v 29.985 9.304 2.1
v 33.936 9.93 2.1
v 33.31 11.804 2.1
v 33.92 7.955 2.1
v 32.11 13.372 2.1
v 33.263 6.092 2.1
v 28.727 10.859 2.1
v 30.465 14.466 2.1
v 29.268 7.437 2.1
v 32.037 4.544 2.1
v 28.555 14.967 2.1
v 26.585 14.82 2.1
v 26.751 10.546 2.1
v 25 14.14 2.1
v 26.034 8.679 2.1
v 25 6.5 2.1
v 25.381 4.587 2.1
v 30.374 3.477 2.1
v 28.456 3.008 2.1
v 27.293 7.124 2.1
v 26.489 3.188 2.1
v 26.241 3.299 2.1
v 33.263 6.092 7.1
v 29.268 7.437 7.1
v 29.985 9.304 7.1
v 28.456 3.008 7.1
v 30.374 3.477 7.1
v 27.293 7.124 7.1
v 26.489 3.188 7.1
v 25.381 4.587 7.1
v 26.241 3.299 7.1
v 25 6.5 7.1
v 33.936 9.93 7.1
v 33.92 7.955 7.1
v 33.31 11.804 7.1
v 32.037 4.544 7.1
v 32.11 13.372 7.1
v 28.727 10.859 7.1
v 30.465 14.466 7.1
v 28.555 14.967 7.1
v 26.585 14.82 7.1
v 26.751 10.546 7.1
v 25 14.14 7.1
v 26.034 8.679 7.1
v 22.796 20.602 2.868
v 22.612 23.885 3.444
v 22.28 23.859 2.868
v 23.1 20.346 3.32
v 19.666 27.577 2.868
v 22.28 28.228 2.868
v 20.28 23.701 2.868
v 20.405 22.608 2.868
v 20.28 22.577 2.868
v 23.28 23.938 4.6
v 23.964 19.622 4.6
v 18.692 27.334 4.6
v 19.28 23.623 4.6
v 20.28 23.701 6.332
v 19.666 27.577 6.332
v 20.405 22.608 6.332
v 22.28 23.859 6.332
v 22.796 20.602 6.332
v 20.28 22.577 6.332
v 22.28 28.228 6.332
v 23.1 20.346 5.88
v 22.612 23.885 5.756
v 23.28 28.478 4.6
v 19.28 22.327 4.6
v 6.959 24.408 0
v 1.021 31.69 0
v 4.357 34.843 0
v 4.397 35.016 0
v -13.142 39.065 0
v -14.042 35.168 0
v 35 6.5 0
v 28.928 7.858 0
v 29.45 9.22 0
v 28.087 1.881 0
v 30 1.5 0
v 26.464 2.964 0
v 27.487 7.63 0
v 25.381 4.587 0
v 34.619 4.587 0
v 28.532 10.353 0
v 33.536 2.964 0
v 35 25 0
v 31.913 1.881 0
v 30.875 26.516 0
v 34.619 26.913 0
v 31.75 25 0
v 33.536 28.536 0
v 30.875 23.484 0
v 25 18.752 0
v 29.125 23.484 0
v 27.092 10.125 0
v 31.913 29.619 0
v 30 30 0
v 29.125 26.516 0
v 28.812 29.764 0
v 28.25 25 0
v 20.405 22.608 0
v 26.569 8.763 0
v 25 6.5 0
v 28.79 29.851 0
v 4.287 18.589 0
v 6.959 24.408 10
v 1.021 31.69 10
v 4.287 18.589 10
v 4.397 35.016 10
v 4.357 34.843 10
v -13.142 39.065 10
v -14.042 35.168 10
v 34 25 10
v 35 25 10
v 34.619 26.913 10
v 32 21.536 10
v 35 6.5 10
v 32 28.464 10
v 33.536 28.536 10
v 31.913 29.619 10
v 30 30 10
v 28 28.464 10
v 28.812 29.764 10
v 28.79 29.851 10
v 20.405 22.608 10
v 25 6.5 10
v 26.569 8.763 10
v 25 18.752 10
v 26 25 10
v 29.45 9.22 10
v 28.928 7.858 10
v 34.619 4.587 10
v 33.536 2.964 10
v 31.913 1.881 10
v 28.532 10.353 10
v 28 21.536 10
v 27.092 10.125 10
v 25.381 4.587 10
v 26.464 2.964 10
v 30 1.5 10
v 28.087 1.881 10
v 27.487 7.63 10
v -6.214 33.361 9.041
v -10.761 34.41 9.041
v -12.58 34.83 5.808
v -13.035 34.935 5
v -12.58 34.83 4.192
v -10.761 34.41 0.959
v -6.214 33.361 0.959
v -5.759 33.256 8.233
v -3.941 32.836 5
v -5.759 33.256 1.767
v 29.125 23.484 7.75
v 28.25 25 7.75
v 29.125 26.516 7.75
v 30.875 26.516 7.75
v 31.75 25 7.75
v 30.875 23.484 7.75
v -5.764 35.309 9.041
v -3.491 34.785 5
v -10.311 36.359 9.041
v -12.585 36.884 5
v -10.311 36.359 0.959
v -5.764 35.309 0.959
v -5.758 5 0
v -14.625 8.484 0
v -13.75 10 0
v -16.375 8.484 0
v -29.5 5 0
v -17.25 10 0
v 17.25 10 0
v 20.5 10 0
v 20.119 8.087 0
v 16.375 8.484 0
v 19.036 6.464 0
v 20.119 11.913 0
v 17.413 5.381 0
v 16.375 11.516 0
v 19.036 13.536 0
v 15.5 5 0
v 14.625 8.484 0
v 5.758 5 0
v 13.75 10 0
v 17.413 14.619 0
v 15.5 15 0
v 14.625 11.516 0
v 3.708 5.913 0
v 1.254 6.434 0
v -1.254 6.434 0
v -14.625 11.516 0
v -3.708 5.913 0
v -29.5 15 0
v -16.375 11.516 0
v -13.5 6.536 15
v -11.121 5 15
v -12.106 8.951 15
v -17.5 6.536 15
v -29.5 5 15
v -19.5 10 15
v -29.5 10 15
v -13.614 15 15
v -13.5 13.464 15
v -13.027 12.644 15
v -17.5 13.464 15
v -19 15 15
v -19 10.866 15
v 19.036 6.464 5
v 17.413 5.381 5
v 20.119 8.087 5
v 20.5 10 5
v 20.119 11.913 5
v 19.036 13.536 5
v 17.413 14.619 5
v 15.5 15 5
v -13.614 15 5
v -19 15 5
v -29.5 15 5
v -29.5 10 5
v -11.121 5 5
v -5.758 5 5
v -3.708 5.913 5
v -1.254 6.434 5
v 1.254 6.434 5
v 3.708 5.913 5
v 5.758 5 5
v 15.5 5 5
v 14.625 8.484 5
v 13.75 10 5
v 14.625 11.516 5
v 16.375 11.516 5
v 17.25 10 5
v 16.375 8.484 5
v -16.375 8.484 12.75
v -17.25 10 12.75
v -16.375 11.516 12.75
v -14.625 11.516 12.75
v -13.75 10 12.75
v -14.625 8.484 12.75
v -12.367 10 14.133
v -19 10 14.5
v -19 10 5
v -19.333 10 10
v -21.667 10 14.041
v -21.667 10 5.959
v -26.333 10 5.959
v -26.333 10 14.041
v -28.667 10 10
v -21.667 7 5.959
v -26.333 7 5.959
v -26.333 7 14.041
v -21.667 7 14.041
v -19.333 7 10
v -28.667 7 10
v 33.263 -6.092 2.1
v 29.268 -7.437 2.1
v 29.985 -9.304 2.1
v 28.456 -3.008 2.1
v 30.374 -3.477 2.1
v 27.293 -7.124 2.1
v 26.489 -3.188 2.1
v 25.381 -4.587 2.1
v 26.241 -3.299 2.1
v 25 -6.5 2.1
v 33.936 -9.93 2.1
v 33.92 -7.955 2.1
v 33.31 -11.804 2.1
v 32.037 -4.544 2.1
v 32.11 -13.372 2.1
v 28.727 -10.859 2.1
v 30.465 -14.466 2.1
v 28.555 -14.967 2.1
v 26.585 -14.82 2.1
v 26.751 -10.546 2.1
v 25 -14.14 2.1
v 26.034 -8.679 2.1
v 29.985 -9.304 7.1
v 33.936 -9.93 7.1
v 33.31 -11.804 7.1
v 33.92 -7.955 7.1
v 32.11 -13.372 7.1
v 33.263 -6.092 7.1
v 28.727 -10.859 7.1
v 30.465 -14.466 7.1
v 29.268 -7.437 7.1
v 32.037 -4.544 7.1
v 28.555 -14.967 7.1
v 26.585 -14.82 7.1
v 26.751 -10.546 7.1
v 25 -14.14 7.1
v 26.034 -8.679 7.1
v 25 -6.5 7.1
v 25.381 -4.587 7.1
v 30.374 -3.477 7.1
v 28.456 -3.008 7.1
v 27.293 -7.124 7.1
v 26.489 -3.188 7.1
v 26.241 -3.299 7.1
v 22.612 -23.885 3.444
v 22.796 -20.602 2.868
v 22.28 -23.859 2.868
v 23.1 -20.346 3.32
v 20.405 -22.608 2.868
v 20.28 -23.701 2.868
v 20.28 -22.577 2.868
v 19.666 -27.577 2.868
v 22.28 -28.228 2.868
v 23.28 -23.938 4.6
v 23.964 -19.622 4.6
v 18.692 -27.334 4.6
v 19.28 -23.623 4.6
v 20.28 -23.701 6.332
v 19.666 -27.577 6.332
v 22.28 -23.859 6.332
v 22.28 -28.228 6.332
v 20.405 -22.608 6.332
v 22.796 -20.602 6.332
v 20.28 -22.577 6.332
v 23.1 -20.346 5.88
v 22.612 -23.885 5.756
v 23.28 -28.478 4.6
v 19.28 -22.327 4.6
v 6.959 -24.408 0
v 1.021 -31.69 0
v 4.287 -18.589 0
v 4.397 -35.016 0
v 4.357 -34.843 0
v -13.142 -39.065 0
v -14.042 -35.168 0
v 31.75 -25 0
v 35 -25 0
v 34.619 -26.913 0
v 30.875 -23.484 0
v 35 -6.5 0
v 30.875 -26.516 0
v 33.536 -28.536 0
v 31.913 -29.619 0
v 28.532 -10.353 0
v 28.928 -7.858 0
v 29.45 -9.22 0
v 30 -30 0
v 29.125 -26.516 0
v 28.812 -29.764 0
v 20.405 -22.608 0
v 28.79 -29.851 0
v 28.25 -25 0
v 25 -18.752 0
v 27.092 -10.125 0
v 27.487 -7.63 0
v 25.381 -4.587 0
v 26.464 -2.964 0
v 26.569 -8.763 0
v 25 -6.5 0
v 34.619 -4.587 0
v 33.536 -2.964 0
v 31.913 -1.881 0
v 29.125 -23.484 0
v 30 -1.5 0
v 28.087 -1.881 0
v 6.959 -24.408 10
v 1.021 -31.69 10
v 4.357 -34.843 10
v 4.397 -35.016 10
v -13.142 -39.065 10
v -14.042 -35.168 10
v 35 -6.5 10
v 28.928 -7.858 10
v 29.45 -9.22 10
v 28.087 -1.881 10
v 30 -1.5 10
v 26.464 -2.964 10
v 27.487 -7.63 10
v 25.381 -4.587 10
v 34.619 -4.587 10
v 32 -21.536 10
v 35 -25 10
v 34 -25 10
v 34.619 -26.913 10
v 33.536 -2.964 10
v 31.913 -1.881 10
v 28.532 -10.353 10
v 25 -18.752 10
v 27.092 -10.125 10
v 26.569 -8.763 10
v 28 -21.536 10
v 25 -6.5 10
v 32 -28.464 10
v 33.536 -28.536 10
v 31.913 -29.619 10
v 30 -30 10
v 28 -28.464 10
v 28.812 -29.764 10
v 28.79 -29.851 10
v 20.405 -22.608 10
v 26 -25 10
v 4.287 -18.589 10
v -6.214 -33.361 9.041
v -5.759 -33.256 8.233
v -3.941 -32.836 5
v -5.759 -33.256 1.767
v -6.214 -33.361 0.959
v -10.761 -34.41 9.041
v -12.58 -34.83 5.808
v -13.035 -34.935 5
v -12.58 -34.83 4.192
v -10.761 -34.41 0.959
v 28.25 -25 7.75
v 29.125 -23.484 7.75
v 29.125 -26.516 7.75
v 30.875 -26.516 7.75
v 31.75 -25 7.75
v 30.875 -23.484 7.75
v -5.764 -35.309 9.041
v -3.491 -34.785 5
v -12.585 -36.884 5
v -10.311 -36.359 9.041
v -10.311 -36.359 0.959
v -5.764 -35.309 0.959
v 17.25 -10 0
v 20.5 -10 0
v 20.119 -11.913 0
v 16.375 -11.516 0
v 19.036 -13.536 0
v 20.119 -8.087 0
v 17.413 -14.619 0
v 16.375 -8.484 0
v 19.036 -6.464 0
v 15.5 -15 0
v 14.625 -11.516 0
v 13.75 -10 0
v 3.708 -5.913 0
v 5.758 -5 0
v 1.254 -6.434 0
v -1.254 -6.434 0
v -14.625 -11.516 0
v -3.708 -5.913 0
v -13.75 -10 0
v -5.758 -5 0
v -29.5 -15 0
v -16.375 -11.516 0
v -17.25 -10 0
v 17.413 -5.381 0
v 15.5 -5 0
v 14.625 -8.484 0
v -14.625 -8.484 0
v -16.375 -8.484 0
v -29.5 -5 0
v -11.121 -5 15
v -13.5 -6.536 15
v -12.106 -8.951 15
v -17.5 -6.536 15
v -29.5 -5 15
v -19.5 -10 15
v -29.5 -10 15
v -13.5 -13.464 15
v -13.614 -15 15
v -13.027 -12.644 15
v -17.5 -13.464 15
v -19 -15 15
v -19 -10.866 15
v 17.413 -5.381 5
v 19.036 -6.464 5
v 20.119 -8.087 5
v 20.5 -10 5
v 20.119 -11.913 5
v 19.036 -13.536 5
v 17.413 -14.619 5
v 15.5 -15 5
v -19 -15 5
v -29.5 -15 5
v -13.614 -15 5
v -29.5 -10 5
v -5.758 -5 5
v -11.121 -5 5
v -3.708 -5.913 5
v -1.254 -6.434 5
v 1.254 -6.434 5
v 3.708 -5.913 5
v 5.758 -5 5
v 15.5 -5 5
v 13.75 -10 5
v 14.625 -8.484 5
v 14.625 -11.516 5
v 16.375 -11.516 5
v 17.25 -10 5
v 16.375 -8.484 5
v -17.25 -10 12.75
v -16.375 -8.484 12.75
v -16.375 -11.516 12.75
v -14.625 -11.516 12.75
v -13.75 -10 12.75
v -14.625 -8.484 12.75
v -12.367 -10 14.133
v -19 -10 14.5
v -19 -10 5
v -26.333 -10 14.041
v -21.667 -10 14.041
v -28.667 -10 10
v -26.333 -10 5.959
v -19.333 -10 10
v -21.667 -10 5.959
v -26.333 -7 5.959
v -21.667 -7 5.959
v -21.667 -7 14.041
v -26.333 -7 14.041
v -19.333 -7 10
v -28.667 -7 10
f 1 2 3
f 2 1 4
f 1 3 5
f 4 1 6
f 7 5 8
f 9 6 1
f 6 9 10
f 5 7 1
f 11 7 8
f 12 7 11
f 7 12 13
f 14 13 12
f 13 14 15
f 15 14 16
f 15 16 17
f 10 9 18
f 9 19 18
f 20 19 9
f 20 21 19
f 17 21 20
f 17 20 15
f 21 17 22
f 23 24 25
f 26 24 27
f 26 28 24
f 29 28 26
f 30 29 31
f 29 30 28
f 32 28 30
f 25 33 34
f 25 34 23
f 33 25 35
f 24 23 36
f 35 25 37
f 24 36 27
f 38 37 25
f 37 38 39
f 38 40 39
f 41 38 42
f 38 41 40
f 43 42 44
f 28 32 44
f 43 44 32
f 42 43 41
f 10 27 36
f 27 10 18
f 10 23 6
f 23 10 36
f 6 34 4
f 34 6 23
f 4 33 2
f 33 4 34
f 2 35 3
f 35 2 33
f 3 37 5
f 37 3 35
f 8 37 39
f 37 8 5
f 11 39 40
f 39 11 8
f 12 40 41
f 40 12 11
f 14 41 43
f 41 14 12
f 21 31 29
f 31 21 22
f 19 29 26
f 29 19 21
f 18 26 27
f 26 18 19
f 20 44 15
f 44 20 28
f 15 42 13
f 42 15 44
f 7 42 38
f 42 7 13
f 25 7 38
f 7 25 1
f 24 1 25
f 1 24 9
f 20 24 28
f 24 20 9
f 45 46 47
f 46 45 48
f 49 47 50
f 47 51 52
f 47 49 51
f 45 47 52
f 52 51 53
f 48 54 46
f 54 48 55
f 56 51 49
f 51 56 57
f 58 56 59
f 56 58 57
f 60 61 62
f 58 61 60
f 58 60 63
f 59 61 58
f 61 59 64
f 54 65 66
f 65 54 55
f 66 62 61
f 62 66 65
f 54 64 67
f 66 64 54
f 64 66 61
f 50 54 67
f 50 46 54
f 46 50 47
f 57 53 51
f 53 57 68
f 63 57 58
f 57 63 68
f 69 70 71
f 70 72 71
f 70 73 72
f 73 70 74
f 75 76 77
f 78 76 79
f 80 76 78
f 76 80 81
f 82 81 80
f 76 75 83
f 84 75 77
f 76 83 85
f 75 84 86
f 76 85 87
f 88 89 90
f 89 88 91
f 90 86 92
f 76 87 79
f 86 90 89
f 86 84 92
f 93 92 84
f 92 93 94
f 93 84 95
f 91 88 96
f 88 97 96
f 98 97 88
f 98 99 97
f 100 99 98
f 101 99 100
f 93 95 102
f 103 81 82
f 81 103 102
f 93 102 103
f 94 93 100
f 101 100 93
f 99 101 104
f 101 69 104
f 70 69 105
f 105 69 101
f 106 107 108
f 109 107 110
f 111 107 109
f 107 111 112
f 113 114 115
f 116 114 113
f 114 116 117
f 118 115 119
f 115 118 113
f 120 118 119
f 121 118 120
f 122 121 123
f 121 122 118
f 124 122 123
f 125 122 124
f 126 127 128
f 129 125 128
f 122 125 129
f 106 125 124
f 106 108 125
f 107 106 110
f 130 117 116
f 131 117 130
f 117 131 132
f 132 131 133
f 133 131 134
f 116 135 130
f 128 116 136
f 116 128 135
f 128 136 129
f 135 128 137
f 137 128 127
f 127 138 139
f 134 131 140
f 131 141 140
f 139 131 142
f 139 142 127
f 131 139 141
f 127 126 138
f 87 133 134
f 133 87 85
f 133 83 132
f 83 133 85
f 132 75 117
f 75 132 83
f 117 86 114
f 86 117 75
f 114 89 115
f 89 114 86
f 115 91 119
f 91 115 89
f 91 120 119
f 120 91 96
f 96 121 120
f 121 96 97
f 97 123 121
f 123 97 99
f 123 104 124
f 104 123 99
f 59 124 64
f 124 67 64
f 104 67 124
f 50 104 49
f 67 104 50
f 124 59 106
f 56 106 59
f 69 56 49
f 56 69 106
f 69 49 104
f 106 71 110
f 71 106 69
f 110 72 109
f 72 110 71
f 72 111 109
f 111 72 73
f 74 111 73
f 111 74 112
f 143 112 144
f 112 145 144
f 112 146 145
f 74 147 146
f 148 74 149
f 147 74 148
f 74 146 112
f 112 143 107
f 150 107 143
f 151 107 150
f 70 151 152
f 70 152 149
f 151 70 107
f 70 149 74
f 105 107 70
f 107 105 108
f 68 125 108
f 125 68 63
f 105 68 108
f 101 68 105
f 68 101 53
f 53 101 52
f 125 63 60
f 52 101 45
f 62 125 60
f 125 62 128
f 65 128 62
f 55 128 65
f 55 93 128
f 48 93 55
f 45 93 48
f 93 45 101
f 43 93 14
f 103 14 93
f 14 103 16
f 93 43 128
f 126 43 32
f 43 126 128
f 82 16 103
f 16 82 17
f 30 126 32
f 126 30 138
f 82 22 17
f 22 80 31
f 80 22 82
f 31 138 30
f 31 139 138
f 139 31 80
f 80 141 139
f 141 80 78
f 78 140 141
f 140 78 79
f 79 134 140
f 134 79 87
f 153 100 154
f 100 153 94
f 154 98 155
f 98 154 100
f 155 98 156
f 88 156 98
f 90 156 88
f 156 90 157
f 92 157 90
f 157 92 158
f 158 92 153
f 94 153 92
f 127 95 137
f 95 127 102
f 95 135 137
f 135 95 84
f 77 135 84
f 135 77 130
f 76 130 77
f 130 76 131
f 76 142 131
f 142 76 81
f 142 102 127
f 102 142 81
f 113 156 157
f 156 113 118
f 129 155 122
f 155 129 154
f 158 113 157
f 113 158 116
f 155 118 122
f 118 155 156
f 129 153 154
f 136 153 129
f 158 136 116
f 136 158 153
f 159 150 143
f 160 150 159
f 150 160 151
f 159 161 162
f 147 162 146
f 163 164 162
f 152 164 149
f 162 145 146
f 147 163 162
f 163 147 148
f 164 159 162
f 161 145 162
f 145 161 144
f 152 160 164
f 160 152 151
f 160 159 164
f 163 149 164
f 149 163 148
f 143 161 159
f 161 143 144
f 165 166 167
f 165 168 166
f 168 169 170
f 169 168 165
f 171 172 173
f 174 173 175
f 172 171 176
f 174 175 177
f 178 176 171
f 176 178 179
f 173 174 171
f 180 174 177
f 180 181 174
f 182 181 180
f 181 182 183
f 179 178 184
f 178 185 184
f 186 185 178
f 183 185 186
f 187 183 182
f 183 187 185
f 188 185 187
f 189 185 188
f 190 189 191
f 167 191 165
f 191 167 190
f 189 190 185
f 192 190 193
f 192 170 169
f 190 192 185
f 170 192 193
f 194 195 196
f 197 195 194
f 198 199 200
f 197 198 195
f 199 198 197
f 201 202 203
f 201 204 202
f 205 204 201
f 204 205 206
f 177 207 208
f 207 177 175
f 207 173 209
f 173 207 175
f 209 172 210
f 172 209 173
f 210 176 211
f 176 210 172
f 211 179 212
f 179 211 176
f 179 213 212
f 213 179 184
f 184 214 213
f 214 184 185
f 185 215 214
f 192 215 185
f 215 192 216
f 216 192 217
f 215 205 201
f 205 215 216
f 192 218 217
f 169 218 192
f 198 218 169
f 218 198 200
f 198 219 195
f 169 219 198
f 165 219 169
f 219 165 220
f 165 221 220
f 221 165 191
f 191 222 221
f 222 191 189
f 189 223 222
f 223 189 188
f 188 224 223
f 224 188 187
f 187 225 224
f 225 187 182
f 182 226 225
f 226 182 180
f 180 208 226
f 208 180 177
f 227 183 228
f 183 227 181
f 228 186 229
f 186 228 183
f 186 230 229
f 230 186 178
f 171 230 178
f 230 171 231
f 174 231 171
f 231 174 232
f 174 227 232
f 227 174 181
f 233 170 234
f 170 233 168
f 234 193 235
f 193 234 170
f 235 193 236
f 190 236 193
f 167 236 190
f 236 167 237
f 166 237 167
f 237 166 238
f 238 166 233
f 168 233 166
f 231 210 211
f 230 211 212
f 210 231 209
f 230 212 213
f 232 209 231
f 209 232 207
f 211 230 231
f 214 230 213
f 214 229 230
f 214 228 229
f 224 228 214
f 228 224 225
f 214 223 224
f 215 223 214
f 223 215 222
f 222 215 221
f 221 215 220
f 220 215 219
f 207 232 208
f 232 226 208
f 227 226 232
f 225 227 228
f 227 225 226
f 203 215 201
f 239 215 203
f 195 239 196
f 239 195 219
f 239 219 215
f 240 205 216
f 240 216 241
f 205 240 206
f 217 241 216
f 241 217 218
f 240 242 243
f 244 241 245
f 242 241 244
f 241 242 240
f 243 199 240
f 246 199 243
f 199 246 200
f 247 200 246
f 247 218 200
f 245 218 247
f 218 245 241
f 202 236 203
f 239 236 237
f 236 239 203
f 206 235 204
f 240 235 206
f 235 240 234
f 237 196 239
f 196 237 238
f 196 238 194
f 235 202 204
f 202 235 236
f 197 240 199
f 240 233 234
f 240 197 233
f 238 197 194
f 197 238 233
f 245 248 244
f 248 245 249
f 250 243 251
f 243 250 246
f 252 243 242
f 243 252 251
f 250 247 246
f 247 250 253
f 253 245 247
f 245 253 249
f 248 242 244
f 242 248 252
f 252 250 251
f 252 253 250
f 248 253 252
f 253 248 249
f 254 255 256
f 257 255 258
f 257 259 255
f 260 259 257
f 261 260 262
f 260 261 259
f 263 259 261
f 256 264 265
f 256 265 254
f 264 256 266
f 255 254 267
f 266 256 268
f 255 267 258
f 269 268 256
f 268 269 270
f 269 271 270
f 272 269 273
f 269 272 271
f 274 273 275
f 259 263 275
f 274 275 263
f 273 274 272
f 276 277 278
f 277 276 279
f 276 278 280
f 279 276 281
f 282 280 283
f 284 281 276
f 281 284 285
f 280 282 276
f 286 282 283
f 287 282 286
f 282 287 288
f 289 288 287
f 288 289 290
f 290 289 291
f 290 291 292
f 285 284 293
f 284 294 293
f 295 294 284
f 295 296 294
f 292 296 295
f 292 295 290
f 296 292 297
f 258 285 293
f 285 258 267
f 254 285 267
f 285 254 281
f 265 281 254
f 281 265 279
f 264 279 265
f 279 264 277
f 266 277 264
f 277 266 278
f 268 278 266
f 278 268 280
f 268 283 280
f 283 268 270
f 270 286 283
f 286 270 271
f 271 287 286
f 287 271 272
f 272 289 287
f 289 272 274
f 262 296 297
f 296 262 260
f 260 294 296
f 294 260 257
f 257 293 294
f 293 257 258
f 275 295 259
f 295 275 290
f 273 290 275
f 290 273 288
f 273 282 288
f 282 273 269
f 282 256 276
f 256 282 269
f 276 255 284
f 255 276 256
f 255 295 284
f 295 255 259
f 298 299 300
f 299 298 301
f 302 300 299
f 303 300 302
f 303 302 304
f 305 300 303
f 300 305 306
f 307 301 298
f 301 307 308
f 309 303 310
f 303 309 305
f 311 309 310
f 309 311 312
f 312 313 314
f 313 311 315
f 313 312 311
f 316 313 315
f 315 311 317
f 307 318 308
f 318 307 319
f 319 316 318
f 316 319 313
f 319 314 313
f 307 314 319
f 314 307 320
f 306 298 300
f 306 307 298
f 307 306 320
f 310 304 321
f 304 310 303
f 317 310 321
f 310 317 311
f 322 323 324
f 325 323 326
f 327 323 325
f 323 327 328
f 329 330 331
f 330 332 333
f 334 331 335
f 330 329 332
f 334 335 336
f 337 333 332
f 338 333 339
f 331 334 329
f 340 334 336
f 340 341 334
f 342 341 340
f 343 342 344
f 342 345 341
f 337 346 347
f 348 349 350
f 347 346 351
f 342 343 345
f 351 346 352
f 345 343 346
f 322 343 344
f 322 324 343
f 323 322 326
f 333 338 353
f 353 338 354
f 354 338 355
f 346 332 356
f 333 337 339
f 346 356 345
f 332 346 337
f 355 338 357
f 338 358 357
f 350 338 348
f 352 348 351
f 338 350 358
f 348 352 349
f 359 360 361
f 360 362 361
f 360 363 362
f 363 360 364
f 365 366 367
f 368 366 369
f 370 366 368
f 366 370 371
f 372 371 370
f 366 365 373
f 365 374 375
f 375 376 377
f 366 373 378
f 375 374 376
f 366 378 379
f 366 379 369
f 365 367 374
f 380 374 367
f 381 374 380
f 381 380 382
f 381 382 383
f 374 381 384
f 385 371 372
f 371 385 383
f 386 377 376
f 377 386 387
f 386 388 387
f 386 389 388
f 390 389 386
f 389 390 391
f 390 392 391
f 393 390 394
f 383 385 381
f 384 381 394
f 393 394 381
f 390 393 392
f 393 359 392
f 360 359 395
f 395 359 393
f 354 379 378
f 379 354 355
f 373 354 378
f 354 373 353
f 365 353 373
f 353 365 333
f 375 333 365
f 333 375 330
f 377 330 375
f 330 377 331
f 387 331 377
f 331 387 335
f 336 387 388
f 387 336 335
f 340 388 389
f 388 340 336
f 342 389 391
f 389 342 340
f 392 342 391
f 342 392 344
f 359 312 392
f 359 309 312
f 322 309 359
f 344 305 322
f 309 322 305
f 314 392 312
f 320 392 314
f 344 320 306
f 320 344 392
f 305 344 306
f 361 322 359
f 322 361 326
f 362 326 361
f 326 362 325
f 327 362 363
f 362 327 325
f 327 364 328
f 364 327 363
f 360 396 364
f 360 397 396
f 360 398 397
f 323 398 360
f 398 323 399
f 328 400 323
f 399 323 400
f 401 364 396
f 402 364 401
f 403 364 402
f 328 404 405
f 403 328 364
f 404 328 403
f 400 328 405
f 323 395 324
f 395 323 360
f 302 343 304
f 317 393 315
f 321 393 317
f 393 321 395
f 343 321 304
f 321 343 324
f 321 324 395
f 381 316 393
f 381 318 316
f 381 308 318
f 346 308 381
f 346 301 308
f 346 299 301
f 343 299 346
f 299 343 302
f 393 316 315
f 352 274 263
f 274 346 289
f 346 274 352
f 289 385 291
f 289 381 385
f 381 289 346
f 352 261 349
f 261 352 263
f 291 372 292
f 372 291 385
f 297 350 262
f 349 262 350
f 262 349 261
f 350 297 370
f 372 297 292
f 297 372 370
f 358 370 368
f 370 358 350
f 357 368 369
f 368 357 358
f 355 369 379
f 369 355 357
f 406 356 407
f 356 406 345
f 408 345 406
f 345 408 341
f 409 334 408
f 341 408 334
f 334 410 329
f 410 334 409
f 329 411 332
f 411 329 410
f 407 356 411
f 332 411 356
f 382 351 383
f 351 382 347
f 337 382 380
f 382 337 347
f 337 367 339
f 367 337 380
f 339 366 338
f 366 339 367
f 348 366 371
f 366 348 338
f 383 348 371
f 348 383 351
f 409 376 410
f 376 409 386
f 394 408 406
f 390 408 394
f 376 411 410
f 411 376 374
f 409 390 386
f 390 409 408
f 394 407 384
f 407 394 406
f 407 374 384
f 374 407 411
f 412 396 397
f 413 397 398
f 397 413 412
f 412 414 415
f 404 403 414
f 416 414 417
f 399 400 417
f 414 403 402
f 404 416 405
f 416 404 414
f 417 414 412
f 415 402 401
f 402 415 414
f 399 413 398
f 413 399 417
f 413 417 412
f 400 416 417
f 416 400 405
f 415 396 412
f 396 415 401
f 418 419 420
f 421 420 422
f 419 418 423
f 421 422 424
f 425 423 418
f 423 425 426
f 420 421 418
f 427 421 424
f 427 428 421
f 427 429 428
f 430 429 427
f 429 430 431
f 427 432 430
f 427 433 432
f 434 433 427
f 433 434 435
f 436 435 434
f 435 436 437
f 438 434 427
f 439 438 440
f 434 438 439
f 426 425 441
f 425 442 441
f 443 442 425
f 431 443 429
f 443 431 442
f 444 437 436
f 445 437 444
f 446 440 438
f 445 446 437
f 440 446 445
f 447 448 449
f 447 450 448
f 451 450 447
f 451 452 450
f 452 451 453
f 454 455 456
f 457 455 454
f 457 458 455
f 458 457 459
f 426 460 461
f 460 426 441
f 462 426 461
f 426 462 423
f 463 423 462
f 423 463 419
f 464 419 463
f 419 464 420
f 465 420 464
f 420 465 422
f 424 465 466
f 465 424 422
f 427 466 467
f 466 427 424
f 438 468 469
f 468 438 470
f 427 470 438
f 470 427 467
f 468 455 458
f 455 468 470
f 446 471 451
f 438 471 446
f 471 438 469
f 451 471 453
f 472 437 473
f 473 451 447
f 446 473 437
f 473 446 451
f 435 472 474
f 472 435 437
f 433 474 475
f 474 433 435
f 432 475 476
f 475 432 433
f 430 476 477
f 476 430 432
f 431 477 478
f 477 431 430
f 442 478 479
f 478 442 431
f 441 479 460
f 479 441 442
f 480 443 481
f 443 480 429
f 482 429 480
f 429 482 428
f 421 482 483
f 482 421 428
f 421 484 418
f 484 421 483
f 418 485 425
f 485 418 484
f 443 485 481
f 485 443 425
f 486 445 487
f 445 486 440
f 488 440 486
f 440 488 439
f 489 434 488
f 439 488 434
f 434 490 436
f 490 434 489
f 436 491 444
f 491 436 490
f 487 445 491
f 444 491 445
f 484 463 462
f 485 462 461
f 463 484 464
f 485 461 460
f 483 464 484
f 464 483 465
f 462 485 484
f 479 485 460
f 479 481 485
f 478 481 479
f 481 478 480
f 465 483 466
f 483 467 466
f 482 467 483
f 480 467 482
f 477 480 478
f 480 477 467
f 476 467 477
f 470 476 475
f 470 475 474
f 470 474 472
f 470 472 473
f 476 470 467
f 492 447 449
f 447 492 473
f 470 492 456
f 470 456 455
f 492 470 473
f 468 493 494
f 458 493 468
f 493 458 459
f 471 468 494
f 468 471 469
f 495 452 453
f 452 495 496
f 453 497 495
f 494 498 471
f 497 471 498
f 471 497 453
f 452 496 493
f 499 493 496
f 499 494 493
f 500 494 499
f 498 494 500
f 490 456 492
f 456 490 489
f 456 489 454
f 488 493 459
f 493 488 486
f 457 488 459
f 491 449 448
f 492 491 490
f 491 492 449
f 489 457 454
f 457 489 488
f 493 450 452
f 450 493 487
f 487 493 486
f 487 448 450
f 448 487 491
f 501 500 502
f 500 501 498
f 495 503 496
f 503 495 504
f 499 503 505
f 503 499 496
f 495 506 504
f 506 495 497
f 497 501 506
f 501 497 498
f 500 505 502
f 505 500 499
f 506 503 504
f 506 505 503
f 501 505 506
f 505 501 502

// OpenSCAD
filament_d = 1.75;
spring_d = 8;

plate_LR();
//plate();
//assembly();

module plate_LR(offset_y=10.0) {
  translate([0,offset_y,0]) plate();
  translate([0,-offset_y,0]) mirror([0,1,0]) plate();
}

module plate(){
translate([30,15,0])idler();
base();
}

module assembly(){
union(){
translate([0, 15.5, 0]) base();
translate([15.5, 15.5, 0]) {
	%translate([-15.5, -15.5, 0]) translate([10.56 / 2 + 4 + filament_d, 0, 7.7]) linear_extrude(height = 4, convexity = 5) difference() {// 693 bearing
		circle(4);
		circle(1.5, $fn = 6);
	}

	translate([0, 0, 5]) rotate(-9) idler();
}
%translate([-15.5+9,20.5,0])cube([30,5,15]);
%translate([0, 0, 2]) difference() {// drive gear
	linear_extrude(height = 11, convexity = 5) difference() {
		circle(6.3);
		circle(2.5);
	}
	translate([0, 0, 7.7]) rotate_extrude(convexity = 5, $fs = 0.5) translate([5 + 2.5, 0, 0]) circle(r = 2);
}}}

module idler() difference() {
	linear_extrude(height = 10, convexity = 5) difference() {
		union() {
			circle(5);
			translate([0, -18.5, 0]) circle(5);
			rotate(180) translate([-5, 0, 0]) square([10, 18.5]);
			rotate(104){
				square([5, 25]);
				translate([0,22.5])square([15.8,4]);
			}
			rotate(77)translate([0,27.2])square([4,18]);
			rotate(50) translate([-8, -2, 0]) square([5, 10]);
		}
		circle(3 * 7/12, $fn = 6);
		rotate(9) translate([-15.5 + 10.56 / 2 + 4 + filament_d, -15.5, 0]) circle(2.5* 7/12, $fn = 6);
	}
	translate([0, 0, 4.6]) {
		rotate(9) translate([-15.5 + 10.56 / 2 + 4 + filament_d, -15.5, 0]) linear_extrude(height = 5, convexity = 5, center = true) difference() {
			circle(6);
			circle(2, $fn = 6);
		}
		translate([10.56 / 2 + 1.5, 0, 0]) rotate([-90, 0, 9]) translate([-15.5, 0, -15.5]) cylinder(r = 2, h = 50, $fn = 6);
		translate([10.56 / 2 + 1.5, 0, 0]) rotate([-90, 0, 0]) translate([-15.5, 0, -15.5]) rotate([0, 0, 0]) cylinder(r = 2, h = 100, center = true, $fn = 6);
	}
	translate([0, 0, 10 - 4]) cylinder(r1 = 0, r2 = 8, h = 8, $fn = 6);
	translate([0, 0, 10 / 2]) rotate([90, 0, -13]) translate([-24-15.5, 0, -2]) cylinder(r = spring_d * 7/12, h = 10, $fn = 6);
}

module base() difference() {
	linear_extrude(height = 15, convexity = 5) difference() {
		union() {
			translate([-7,0,0])square([45, 10], center = true);
			translate([15.5, 0, 0]) circle(5);
		}
		for (side = [1, -1]) translate([side * 15.5, 0, 0]) circle(3 * 7/12, $fn = 6);
		translate([0, -15.5, 0]) circle(12);
	}
	rotate([0,0,14])translate([-12, -10, 5]) linear_extrude(height = 15, convexity = 5)square(100);
	translate([-39,0,5])cube(20);
	translate([-15.5, 0, 15 - 4]) cylinder(r1 = 0, r2 = 8, h = 8, $fn = 6);
	translate([-24, 7, 10]) rotate([90,0,0])cylinder(r = spring_d * 7/12,h=10, $fn = 6);
}
